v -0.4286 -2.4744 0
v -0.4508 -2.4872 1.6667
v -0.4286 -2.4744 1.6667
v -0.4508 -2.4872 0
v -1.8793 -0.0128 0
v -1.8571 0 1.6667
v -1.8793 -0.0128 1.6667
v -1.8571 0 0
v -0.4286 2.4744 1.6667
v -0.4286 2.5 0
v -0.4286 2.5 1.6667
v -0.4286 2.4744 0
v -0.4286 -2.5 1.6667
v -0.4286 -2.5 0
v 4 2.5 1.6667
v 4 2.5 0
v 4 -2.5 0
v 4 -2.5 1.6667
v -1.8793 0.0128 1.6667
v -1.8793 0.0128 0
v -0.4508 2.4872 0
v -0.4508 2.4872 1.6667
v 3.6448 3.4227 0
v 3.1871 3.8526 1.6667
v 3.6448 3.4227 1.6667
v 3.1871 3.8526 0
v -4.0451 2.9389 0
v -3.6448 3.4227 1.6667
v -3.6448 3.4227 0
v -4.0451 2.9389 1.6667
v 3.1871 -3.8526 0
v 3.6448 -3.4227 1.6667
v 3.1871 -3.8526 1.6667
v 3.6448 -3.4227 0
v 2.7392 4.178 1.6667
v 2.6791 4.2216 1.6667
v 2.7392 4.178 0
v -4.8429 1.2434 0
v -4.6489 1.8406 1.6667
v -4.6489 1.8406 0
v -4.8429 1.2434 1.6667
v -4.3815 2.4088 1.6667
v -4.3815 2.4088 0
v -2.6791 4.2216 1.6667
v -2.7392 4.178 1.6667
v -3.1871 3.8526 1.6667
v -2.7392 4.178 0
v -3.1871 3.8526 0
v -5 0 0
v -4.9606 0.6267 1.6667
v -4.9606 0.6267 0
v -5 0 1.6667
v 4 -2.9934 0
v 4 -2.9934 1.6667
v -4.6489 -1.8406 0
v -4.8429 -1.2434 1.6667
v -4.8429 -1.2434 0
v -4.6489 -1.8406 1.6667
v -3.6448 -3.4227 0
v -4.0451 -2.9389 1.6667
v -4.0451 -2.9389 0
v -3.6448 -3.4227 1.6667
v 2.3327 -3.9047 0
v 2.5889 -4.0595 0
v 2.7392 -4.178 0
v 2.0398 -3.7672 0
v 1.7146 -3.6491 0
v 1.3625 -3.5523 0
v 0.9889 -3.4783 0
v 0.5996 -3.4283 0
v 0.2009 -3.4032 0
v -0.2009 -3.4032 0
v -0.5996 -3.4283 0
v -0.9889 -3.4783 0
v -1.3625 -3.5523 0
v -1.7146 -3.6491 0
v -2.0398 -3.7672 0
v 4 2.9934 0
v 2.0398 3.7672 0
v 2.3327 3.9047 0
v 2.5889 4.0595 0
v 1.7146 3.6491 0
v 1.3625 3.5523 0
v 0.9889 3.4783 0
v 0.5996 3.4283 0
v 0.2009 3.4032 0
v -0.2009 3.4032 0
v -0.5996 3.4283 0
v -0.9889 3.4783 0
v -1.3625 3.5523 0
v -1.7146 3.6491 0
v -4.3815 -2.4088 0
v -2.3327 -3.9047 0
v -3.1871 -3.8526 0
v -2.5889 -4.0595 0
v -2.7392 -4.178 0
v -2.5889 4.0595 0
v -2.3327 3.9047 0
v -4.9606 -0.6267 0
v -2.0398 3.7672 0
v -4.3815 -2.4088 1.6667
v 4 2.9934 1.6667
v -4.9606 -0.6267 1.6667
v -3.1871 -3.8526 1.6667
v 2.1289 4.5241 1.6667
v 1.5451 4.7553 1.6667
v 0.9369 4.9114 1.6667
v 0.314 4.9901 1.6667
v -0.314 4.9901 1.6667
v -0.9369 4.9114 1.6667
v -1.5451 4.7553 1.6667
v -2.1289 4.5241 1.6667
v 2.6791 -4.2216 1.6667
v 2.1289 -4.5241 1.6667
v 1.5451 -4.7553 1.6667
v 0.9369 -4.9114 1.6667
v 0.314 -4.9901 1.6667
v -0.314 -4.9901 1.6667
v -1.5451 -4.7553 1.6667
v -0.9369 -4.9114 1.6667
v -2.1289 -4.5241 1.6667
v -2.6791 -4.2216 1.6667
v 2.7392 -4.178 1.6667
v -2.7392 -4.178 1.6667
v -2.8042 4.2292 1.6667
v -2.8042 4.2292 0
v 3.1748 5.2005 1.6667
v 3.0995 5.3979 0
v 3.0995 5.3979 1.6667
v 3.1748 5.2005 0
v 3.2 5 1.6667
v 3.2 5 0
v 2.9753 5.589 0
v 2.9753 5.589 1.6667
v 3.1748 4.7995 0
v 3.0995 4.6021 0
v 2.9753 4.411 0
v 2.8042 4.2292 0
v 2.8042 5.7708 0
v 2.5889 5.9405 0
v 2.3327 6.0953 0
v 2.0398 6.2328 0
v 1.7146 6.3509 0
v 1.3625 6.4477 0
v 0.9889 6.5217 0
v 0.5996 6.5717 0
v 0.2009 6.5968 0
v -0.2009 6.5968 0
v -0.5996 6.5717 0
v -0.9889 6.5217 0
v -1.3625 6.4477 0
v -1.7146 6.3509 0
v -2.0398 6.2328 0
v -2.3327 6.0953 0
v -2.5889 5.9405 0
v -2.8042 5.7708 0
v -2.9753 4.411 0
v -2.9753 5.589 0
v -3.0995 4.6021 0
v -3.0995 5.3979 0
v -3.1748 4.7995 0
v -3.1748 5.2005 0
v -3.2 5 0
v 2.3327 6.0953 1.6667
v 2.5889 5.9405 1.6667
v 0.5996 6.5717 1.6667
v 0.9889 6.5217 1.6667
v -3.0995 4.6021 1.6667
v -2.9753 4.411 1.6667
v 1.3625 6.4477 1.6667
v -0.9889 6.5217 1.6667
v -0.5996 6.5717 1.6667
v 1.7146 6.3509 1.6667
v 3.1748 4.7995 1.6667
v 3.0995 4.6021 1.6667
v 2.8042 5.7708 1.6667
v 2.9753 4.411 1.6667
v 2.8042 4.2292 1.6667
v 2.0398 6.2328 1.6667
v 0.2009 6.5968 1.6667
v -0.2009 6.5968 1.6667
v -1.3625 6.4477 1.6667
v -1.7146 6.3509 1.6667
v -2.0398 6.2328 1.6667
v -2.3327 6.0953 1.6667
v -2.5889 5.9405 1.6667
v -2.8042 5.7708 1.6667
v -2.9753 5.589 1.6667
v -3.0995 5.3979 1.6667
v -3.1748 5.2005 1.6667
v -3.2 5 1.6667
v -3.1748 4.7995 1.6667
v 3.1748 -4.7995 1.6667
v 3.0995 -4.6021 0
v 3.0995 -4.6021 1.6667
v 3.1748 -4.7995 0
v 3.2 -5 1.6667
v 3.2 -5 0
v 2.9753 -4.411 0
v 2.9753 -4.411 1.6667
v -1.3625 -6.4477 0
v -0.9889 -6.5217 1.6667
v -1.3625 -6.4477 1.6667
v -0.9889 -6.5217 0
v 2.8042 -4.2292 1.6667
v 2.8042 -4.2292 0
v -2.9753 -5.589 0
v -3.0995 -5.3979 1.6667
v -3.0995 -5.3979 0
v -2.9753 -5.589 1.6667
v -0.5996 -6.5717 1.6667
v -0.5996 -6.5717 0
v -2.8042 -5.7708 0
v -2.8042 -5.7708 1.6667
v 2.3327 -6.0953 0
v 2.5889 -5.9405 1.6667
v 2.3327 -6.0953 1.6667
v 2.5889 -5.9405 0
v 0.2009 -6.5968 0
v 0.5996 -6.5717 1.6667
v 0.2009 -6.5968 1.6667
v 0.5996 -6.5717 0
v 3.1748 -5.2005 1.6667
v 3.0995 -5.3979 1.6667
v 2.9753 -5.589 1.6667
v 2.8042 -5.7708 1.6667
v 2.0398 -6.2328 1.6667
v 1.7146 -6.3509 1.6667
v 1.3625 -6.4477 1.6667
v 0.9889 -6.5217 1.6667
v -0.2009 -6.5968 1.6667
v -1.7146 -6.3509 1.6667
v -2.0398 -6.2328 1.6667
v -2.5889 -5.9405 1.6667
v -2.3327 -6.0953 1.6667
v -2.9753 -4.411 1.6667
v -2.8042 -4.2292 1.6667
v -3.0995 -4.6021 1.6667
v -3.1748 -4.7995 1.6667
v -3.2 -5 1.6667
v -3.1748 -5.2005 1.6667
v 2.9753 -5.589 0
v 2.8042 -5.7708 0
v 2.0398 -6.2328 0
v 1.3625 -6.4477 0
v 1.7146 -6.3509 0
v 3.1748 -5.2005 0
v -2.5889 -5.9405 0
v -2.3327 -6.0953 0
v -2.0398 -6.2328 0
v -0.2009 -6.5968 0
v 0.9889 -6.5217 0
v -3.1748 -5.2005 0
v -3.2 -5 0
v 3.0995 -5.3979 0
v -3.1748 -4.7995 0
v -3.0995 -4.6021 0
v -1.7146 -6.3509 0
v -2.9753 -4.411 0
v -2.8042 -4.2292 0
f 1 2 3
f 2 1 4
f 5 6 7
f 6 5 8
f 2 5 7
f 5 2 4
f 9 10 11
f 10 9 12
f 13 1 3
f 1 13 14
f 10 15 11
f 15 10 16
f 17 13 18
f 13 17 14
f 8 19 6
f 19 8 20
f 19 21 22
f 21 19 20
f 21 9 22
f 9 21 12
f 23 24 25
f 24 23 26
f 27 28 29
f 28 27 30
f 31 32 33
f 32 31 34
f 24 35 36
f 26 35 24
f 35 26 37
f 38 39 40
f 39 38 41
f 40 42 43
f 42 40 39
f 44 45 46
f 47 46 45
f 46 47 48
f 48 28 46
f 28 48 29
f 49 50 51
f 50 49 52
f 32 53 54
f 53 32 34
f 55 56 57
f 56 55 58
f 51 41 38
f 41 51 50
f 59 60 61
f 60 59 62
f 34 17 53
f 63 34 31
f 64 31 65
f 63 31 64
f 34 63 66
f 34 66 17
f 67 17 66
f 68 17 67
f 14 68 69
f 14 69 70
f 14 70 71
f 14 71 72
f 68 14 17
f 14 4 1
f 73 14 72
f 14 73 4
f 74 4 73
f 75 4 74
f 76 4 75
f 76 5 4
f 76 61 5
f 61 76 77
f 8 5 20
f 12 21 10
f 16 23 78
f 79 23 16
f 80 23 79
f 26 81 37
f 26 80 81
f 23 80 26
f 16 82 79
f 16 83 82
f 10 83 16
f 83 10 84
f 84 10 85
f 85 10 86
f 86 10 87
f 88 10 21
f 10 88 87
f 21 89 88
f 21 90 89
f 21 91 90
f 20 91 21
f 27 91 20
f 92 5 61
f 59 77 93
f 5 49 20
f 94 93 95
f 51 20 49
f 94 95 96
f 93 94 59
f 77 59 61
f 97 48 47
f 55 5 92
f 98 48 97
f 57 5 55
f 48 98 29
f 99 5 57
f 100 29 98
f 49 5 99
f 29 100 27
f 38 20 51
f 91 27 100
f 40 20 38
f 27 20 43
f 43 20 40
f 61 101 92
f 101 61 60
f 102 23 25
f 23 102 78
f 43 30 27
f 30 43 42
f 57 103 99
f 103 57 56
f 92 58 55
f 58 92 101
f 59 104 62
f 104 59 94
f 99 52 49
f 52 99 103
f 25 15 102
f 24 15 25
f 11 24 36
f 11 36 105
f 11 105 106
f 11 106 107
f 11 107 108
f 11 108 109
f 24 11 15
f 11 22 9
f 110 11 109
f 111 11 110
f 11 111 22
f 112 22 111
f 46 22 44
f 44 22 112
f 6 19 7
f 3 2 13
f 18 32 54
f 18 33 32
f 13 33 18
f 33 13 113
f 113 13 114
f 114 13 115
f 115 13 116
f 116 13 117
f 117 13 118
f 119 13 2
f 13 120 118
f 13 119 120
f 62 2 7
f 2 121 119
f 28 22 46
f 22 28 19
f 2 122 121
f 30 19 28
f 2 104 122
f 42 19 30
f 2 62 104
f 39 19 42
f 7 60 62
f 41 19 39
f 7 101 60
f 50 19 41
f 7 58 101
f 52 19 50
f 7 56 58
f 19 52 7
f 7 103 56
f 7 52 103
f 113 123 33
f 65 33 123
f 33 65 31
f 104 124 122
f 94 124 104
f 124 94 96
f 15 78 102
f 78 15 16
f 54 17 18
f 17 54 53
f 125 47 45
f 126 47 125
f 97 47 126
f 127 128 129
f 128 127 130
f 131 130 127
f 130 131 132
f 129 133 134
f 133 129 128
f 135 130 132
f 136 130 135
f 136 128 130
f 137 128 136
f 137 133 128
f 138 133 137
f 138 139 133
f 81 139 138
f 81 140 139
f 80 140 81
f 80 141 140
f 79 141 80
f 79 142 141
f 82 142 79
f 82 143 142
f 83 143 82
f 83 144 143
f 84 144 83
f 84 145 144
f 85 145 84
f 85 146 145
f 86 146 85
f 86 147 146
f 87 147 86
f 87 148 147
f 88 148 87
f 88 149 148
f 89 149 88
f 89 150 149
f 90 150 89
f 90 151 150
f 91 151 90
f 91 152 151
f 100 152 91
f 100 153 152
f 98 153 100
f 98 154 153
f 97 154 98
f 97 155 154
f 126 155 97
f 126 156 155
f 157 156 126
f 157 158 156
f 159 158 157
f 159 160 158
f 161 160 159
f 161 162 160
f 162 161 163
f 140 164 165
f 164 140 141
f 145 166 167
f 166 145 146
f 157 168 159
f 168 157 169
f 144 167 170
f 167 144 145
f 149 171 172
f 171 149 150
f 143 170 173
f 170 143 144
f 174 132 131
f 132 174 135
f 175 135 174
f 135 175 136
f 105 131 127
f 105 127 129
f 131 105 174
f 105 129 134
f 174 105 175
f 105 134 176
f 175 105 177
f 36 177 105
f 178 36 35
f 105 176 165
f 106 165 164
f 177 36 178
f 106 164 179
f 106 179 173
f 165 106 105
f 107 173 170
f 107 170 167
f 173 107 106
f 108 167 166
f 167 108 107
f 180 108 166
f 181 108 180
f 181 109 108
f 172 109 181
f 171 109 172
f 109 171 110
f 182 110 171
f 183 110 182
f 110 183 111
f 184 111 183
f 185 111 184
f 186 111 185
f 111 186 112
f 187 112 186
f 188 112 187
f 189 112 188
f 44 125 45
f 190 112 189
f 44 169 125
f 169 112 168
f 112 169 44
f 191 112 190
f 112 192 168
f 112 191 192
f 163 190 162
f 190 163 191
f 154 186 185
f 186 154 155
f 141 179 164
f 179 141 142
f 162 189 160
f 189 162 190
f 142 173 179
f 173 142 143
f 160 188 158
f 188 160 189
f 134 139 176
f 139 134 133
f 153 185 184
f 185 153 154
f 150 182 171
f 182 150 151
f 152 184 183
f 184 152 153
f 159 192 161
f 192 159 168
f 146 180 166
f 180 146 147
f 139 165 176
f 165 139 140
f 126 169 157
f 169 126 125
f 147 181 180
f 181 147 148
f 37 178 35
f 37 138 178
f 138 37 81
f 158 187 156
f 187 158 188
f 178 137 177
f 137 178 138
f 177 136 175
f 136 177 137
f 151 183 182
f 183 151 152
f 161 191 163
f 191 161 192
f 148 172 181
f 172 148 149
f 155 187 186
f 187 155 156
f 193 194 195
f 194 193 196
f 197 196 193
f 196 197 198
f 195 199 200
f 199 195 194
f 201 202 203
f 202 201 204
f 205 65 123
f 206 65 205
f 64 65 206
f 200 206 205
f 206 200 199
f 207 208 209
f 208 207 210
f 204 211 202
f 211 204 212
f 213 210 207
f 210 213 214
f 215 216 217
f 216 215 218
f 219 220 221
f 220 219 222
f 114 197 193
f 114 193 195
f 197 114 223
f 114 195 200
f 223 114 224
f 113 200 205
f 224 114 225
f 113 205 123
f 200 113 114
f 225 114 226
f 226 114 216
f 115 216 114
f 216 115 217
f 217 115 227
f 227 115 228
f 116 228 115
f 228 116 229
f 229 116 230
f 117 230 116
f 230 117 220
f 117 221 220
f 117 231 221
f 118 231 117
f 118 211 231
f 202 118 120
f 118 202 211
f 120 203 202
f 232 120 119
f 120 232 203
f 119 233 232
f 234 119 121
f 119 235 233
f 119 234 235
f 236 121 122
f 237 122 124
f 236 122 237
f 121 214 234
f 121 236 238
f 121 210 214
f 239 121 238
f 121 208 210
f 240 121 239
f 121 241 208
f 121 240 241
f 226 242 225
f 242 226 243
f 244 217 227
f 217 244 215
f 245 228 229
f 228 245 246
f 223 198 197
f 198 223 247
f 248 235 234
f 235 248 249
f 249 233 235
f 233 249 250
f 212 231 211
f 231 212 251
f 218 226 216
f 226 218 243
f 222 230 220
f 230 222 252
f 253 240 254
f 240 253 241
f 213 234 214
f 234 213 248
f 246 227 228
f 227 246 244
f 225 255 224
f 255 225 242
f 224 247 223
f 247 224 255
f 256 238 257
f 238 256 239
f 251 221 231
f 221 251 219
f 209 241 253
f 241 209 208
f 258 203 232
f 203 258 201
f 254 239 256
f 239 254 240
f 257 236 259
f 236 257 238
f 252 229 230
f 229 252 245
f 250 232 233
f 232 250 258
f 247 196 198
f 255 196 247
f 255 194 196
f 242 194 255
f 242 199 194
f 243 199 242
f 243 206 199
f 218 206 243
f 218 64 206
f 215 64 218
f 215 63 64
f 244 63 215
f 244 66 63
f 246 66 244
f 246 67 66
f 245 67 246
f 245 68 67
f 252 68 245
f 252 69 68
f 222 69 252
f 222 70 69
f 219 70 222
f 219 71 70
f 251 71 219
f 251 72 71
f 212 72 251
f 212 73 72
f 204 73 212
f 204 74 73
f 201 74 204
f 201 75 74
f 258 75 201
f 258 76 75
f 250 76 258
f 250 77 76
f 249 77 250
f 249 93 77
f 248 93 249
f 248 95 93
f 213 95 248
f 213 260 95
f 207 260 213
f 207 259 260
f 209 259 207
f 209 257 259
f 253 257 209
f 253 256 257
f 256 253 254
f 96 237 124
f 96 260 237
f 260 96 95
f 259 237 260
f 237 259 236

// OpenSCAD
// [FL_INDEX: keywords="openscad, 3d_parametric, Nut_Leia, csg_solid" | COT="Parametric OpenSCAD design from 3DCodeverse"]
// Title: Nut Leia

/* 	Nut-Leia By schlem
		theschlem@gmail.com
	 	6-17-13

A glue-on nut trap for use with laser-cut birch
plywood parts or what have you.  I used these
to hold the bed levelling hardware on my  
Printrbot+

I originally modelled it with square tabs to increase
the torque of the glue attachment, which led to 
the predictable development of a "cinnamon-buns" 
Princess Leia Organa silhouette.  

https://en.wikipedia.org/wiki/Princess_Leia

Hexagon, ellipticalCylinder modules poached from:
 *  OpenSCAD Shapes Library (www.openscad.org)
 *  Copyright (C) 2009  Catarina Mota
 *  Copyright (C) 2010  Elmo Mäntynen
 *
 *  License: LGPL 2.1 or later

*/

// ***************  First Things ***************  

$fn=50*1;

// ***************  Parameters ***************    

// Size of Nut in mm
nut = 5;		// across flats, in MILIMETERS
//		Here's a handy link to inch --> mm conversions
//		http://mdmetric.com/tech/cvtcht.htm



//=== constants and relative values ===

height = nut * .33333333;	// scales height:nut
buns_scale = .80*1;				// scales buns:head

// ***************  Top Level code ***************   

union(){
	jaws(nut);
	CinnamonBuns(nut*buns_scale, (nut/2)*buns_scale, height, nut);
}

// ***************  Modules ***************  

//=== jaws === 

module jaws(x = 4, z = 2) {
	translate([0,0,height/2])
	difference(){
		cylinder(h = height, r =x, center = true);
		
		translate([x/5,0,0])
		union(){
		hexagon(x,x);
		translate([x/2,0,0])
			cube(x, center = true);
		}
		translate([nut*1.8,0,0])
		cube (nut*2, center = true);
	}
}

//=== CinnamonBuns === 

module CinnamonBuns(r1 = 3, r2 = 1.5, h = 2, t = 3){
	translate([0,t,0])
	ellipticalCylinder(r1*buns_scale,r2*buns_scale,h);	

	translate([0,-t,0])
	ellipticalCylinder(r1*buns_scale,r2*buns_scale,h);	
}

//=== hexagon === size is the XY plane size, height in Z

module hexagon(size, height) {
  boxWidth = size/1.75;
  for (r = [-60, 0, 60]) rotate([0,0,r]) cube([boxWidth, size, height], true);
} 

//=== ellipticalCylinder === 

module ellipticalCylinder(w,h, height, center = false) {
  scale([1, h/w, 1]) cylinder(h=height, r=w, center=center);
}
